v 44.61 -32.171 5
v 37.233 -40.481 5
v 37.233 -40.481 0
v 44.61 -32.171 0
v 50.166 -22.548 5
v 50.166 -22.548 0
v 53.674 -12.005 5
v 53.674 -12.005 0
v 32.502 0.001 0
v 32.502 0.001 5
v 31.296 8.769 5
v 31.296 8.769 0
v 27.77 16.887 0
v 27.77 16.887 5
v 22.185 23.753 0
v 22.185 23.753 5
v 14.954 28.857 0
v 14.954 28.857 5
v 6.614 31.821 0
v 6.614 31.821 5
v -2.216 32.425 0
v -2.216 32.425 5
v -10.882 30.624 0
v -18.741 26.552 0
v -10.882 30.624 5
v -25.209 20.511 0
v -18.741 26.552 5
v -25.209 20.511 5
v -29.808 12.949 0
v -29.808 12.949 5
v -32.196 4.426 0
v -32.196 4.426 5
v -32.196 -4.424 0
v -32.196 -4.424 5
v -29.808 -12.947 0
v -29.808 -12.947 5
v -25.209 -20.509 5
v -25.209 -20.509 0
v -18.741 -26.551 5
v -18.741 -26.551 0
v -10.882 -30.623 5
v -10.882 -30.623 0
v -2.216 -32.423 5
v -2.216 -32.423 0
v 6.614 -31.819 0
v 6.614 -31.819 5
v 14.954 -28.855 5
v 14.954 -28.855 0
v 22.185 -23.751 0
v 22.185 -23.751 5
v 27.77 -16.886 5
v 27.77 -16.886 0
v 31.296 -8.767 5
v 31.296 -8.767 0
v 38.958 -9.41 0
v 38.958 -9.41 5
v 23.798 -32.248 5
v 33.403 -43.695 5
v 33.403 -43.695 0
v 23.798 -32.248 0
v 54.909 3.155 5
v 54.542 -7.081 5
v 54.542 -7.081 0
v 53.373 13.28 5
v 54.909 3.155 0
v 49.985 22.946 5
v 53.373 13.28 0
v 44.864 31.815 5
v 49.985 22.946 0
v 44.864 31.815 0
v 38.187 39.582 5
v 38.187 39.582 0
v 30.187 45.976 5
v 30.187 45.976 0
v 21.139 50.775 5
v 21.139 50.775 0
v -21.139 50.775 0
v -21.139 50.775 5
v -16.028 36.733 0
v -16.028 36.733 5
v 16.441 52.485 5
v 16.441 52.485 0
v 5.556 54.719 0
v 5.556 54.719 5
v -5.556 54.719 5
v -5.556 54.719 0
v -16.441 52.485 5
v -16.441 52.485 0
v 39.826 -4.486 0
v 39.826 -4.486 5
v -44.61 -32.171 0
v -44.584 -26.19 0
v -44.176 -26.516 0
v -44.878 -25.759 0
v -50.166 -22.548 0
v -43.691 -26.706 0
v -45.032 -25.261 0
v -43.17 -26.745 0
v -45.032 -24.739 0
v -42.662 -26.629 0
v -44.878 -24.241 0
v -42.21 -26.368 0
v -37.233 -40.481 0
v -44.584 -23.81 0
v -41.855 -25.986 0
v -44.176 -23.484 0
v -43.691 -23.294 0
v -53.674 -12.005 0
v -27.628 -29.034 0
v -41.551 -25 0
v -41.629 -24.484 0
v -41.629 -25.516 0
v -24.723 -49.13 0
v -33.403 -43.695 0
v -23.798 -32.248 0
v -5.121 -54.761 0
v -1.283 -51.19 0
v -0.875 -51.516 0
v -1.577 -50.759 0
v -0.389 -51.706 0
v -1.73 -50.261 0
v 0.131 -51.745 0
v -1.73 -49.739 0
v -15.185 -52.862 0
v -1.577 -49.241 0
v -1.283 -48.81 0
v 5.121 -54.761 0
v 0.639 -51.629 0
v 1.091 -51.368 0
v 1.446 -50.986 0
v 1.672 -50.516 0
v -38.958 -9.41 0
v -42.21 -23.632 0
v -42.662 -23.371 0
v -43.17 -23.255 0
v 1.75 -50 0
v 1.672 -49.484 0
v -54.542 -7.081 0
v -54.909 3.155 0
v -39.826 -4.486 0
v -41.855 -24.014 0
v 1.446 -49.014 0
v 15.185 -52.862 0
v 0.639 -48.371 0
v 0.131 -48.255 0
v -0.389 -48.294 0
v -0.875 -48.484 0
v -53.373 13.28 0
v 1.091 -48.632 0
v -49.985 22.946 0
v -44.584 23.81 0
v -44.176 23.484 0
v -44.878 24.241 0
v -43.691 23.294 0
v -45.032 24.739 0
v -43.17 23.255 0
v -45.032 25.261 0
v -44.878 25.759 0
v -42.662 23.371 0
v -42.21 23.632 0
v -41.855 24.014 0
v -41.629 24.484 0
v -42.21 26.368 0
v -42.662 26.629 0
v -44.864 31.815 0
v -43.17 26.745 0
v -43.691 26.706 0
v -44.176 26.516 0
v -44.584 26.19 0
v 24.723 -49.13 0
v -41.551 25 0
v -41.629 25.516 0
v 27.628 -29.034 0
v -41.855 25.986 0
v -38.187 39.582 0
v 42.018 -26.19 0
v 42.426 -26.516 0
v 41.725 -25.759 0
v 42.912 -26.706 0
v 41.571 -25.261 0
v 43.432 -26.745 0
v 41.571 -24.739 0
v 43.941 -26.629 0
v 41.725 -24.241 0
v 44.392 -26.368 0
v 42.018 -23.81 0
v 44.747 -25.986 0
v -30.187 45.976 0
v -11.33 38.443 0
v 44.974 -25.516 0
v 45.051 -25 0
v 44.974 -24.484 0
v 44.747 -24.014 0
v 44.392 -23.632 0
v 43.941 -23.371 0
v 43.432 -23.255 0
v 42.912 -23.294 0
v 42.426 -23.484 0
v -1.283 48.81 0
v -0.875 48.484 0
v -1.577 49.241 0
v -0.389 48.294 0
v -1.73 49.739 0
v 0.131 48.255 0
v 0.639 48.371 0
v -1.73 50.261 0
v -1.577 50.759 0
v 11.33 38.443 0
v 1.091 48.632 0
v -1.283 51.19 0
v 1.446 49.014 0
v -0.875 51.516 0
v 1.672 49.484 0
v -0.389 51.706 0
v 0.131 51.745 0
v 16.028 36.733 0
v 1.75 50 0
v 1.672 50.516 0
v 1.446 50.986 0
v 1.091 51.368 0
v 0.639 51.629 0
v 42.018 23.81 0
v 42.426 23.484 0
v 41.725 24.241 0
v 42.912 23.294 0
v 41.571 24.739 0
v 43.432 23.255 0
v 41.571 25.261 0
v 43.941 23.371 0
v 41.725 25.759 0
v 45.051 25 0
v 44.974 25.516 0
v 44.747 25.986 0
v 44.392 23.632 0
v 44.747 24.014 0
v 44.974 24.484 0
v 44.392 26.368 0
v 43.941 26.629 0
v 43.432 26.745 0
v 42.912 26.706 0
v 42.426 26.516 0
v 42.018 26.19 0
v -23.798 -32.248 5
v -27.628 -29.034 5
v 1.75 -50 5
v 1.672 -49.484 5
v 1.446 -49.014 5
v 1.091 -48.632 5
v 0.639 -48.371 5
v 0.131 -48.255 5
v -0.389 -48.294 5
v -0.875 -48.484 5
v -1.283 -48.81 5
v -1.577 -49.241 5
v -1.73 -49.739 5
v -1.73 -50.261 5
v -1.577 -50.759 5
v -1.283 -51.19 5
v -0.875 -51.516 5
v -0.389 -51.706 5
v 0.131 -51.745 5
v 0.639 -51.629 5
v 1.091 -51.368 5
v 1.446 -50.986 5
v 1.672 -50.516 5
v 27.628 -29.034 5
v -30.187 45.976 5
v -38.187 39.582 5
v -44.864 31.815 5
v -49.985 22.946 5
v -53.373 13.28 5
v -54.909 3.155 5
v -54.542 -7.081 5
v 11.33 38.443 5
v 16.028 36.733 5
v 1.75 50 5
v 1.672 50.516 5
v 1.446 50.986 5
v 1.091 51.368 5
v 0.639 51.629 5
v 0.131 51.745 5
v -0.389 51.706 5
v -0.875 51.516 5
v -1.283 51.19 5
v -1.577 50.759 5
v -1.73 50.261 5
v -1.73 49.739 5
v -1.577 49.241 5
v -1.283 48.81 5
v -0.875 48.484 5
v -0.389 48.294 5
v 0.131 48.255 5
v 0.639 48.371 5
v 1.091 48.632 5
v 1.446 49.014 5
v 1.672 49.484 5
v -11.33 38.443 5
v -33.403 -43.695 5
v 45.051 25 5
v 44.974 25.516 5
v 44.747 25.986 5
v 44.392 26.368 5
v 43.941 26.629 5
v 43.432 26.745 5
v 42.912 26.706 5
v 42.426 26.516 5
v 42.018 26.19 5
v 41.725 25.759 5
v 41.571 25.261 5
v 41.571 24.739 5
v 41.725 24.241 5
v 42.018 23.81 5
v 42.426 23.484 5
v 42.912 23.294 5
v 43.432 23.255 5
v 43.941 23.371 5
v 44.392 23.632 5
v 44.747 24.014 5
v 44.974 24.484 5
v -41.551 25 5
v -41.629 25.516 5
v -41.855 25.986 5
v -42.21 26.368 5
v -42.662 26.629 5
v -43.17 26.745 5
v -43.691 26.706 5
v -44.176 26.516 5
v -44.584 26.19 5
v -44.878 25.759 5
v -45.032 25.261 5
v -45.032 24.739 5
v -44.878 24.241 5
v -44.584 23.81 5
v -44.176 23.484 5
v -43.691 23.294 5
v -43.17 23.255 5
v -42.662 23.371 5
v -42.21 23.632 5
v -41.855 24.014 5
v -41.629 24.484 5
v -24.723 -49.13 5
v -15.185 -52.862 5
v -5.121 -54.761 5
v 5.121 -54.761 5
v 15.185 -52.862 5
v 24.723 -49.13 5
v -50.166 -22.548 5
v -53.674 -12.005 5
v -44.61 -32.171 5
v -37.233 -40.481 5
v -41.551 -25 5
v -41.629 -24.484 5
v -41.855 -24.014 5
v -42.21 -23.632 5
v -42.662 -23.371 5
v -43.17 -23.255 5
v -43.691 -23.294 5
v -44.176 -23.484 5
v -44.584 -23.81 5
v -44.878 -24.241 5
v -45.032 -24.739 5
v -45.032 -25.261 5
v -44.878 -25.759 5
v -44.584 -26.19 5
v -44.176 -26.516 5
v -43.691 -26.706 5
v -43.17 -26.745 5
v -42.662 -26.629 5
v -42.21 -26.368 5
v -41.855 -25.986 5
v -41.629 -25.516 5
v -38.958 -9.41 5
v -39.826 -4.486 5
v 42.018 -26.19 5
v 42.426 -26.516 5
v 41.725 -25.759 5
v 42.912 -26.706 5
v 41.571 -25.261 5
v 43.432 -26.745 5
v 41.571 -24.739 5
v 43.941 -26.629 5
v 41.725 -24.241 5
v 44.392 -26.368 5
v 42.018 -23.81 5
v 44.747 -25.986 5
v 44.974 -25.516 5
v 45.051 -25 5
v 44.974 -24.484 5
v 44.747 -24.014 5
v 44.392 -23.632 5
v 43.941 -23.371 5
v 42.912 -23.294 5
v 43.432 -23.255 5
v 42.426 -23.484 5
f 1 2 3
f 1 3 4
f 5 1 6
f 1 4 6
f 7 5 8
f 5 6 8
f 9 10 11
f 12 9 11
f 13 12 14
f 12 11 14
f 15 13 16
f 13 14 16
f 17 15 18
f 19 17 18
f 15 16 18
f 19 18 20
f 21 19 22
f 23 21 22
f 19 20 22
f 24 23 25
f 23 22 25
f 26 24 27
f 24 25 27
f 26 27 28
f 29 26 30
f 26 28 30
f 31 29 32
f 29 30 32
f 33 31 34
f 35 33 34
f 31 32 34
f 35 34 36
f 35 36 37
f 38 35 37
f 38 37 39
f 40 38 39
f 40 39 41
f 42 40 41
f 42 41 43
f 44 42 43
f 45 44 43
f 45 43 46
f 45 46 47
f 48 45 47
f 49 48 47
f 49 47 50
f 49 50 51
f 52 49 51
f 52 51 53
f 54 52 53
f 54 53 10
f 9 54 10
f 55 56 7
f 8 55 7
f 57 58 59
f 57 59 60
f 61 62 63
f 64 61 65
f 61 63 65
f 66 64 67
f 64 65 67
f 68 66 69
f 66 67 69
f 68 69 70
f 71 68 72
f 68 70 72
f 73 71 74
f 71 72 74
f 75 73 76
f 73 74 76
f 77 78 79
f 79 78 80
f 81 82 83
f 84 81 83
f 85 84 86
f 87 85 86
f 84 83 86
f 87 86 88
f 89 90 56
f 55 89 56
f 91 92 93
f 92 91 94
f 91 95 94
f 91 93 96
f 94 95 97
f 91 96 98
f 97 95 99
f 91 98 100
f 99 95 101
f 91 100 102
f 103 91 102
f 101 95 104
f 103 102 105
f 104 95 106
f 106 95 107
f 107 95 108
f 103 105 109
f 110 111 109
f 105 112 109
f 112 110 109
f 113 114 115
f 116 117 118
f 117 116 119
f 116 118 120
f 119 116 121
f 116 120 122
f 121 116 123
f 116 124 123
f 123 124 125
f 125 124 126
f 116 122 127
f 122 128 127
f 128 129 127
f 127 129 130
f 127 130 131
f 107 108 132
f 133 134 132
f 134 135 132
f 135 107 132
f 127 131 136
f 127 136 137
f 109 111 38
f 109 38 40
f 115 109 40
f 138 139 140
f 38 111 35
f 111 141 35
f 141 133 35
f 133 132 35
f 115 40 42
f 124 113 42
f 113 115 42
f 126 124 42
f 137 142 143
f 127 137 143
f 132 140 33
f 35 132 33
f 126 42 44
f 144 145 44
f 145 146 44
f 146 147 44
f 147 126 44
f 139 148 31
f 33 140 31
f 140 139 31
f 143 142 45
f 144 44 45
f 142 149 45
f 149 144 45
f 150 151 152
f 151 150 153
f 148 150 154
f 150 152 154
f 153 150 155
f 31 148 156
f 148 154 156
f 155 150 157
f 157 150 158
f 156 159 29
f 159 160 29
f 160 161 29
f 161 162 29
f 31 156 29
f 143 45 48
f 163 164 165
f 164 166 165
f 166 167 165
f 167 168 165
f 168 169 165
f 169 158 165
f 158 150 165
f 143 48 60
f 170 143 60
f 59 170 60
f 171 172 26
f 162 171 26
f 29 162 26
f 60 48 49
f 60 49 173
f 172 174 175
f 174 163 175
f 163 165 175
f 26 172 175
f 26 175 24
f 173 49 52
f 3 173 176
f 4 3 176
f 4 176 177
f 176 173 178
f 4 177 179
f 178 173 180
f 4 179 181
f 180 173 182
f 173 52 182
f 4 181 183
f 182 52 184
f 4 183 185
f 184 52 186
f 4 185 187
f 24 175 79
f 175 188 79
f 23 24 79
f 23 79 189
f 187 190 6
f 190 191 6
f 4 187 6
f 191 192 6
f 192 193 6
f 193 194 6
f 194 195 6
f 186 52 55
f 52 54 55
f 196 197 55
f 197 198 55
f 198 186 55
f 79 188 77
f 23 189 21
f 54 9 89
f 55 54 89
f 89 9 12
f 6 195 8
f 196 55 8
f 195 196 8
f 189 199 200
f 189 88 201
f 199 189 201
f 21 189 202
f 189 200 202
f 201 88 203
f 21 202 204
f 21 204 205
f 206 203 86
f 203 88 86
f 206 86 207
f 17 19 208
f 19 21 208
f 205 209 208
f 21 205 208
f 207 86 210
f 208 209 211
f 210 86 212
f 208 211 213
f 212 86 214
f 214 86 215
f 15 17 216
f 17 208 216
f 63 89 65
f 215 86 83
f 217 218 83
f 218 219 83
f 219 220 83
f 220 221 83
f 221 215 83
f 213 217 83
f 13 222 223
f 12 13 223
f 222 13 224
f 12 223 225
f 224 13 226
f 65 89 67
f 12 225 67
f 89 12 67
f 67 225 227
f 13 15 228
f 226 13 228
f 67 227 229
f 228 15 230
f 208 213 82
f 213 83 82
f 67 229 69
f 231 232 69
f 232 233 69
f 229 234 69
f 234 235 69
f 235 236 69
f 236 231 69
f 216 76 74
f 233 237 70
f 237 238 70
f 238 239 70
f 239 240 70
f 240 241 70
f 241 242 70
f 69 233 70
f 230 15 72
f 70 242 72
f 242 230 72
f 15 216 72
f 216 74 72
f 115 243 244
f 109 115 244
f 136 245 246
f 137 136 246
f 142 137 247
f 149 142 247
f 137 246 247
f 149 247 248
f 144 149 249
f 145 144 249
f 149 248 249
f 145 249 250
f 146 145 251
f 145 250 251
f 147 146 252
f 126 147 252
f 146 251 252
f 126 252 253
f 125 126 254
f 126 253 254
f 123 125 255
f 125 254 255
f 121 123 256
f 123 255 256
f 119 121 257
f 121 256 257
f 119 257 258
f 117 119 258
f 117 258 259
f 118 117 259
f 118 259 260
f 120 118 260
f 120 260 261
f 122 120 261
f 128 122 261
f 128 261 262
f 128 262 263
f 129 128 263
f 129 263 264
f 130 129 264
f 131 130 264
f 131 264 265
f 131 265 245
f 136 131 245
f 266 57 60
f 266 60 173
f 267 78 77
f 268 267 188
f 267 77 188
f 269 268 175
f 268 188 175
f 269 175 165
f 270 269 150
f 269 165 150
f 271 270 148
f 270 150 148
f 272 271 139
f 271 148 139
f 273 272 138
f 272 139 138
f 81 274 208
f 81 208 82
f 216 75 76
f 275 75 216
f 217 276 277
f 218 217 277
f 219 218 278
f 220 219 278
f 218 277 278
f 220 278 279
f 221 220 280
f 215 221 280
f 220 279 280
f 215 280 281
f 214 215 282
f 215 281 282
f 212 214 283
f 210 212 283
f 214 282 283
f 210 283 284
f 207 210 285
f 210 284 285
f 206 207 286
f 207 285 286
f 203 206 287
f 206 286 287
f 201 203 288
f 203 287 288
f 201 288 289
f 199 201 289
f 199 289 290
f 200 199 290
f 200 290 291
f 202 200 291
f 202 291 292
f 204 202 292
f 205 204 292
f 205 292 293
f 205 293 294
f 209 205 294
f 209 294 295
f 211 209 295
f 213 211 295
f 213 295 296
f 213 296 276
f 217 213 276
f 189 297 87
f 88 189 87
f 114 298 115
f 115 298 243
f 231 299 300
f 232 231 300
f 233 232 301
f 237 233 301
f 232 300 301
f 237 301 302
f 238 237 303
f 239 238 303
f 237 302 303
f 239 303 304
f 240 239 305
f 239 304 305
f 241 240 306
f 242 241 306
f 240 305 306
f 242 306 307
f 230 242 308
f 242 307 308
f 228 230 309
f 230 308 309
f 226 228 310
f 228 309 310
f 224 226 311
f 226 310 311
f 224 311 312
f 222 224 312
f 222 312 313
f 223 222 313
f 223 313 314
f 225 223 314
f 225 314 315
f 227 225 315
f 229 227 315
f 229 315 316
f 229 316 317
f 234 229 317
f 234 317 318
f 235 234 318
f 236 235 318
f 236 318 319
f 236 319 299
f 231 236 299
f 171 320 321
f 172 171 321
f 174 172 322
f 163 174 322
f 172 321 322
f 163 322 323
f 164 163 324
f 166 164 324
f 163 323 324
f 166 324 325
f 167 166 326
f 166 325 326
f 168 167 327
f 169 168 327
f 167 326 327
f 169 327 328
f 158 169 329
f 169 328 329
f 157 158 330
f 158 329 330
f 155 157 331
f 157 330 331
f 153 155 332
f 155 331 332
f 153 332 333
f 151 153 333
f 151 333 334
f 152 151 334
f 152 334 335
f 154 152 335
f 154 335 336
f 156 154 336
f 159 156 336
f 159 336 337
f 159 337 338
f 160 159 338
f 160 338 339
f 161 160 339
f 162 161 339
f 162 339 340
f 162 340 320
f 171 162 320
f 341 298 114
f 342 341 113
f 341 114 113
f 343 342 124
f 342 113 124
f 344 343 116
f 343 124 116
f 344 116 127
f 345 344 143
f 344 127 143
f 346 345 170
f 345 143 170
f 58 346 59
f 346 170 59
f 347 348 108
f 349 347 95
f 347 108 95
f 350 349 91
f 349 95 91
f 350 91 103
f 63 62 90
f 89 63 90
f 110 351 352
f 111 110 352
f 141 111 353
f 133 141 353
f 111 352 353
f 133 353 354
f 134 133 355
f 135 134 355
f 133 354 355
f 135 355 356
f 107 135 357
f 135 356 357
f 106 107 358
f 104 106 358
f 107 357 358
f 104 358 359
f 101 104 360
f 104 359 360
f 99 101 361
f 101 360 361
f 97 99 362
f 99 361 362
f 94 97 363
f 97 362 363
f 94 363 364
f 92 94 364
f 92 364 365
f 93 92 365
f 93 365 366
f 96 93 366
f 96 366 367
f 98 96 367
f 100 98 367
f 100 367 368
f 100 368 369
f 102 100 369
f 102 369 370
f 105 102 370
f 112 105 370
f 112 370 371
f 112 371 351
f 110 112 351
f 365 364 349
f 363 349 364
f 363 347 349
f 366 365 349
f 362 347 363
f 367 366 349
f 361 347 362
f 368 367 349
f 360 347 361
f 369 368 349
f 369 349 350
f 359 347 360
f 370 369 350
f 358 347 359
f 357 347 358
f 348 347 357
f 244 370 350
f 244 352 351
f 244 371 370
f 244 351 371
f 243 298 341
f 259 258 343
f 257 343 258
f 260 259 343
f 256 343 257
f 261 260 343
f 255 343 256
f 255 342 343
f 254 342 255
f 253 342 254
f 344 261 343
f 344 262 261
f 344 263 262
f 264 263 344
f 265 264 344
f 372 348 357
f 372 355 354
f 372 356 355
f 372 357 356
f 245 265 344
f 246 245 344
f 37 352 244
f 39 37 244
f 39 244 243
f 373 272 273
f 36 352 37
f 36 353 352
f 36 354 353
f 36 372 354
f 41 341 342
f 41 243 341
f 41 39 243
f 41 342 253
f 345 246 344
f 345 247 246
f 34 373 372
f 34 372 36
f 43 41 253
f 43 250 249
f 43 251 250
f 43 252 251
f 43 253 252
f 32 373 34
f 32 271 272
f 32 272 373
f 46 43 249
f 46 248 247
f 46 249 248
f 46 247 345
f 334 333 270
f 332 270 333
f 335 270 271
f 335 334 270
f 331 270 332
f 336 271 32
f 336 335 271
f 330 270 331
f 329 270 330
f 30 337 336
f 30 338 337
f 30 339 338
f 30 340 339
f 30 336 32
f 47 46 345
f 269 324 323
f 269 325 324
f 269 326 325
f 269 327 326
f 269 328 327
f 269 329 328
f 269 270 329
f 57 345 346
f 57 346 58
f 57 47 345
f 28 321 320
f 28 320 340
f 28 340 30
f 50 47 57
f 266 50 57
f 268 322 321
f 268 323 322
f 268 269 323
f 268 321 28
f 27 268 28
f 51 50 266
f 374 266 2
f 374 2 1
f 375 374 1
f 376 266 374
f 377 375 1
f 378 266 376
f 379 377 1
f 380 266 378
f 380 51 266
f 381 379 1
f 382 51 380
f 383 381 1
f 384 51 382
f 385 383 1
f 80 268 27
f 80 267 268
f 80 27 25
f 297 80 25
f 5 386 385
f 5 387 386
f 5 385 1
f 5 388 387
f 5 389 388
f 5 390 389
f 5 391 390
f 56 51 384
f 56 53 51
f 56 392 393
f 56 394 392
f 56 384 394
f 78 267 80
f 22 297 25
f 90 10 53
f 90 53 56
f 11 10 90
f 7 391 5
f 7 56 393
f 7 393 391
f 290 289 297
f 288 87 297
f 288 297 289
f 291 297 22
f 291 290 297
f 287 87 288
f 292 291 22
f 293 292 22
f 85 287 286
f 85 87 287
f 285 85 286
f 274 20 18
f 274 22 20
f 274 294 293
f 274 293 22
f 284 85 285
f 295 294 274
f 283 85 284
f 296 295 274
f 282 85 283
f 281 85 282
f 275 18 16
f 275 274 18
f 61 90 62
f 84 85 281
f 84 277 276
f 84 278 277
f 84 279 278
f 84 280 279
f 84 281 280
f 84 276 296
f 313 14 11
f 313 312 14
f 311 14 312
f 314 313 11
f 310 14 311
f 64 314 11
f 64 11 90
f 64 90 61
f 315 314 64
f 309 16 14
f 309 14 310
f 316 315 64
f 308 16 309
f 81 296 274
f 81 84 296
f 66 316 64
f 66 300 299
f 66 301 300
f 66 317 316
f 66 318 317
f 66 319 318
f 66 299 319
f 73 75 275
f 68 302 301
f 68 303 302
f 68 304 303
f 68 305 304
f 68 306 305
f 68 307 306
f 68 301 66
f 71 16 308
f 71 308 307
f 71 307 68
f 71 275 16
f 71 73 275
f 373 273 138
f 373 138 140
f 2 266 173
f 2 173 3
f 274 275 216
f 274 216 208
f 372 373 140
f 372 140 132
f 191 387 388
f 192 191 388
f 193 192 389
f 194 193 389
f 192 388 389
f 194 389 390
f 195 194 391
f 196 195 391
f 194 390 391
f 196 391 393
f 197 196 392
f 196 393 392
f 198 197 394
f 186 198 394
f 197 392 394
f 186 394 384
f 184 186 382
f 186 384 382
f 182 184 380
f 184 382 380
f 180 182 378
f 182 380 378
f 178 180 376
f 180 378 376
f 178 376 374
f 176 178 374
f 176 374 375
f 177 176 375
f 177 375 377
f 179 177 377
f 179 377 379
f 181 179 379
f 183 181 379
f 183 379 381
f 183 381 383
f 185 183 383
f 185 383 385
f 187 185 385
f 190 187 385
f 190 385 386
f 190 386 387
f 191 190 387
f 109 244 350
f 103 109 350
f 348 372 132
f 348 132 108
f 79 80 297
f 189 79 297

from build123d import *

# Parameters (mm, degrees)
CROQUIS1_R              = 55
SALIENTE_EXTRUIR1_DEPTH = 5
CROQUIS2_R              = 1.75
CROQUIS2_R_2            = 32.5
CORTAR_EXTRUIR1_DEPTH   = 78.942286341


with BuildPart() as part:
    # Croquis1 → Saliente-Extruir1 (new body)
    with BuildSketch(Plane.XY):
        Circle(CROQUIS1_R)
    extrude(amount=SALIENTE_EXTRUIR1_DEPTH)

    # Croquis2 → Cortar-Extruir1 (cut, through all)
    with BuildSketch(Plane.XY.offset(5)):
        with Locations((0, 50)):
            Circle(CROQUIS2_R)
        with Locations((43.301270189, 25)):
            Circle(CROQUIS2_R)
        with Locations((43.301270189, -25)):
            Circle(CROQUIS2_R)
        with Locations((0, -50)):
            Circle(CROQUIS2_R)
        with Locations((-43.301270189, -25)):
            Circle(CROQUIS2_R)
        with Locations((-43.301270189, 25)):
            Circle(CROQUIS2_R)
        with Locations((0.001598992, 0.000923179)):
            Circle(CROQUIS2_R_2)
        Polygon((-21.158630785, 50.828665682), (-16.028328636, 36.733276371), (-11.329865532, 38.443377087), (-16.460167682, 52.538766399), align=None)
        Polygon((16.028328636, 36.733276371), (11.329865532, 38.443377087), (16.460167682, 52.538766399), (21.158630785, 50.828665682), align=None)
        Polygon((54.598231114, -7.090421072), (39.826114819, -4.485698407), (38.957873931, -9.409737172), (53.729990226, -12.014459837), align=None)
        Polygon((27.628008399, -29.033639916), (37.269822544, -40.524306562), (33.439600329, -43.738244611), (23.797786183, -32.247577964), align=None)
        Polygon((-33.439600329, -43.738244611), (-23.797786183, -32.247577964), (-27.628008399, -29.033639916), (-37.269822544, -40.524306562), align=None)
        Polygon((-38.957873931, -9.409737172), (-53.729990226, -12.014459837), (-54.598231114, -7.090421072), (-39.826114819, -4.485698407), align=None)
    extrude(amount=-CORTAR_EXTRUIR1_DEPTH, mode=Mode.SUBTRACT)


solid = part.part
